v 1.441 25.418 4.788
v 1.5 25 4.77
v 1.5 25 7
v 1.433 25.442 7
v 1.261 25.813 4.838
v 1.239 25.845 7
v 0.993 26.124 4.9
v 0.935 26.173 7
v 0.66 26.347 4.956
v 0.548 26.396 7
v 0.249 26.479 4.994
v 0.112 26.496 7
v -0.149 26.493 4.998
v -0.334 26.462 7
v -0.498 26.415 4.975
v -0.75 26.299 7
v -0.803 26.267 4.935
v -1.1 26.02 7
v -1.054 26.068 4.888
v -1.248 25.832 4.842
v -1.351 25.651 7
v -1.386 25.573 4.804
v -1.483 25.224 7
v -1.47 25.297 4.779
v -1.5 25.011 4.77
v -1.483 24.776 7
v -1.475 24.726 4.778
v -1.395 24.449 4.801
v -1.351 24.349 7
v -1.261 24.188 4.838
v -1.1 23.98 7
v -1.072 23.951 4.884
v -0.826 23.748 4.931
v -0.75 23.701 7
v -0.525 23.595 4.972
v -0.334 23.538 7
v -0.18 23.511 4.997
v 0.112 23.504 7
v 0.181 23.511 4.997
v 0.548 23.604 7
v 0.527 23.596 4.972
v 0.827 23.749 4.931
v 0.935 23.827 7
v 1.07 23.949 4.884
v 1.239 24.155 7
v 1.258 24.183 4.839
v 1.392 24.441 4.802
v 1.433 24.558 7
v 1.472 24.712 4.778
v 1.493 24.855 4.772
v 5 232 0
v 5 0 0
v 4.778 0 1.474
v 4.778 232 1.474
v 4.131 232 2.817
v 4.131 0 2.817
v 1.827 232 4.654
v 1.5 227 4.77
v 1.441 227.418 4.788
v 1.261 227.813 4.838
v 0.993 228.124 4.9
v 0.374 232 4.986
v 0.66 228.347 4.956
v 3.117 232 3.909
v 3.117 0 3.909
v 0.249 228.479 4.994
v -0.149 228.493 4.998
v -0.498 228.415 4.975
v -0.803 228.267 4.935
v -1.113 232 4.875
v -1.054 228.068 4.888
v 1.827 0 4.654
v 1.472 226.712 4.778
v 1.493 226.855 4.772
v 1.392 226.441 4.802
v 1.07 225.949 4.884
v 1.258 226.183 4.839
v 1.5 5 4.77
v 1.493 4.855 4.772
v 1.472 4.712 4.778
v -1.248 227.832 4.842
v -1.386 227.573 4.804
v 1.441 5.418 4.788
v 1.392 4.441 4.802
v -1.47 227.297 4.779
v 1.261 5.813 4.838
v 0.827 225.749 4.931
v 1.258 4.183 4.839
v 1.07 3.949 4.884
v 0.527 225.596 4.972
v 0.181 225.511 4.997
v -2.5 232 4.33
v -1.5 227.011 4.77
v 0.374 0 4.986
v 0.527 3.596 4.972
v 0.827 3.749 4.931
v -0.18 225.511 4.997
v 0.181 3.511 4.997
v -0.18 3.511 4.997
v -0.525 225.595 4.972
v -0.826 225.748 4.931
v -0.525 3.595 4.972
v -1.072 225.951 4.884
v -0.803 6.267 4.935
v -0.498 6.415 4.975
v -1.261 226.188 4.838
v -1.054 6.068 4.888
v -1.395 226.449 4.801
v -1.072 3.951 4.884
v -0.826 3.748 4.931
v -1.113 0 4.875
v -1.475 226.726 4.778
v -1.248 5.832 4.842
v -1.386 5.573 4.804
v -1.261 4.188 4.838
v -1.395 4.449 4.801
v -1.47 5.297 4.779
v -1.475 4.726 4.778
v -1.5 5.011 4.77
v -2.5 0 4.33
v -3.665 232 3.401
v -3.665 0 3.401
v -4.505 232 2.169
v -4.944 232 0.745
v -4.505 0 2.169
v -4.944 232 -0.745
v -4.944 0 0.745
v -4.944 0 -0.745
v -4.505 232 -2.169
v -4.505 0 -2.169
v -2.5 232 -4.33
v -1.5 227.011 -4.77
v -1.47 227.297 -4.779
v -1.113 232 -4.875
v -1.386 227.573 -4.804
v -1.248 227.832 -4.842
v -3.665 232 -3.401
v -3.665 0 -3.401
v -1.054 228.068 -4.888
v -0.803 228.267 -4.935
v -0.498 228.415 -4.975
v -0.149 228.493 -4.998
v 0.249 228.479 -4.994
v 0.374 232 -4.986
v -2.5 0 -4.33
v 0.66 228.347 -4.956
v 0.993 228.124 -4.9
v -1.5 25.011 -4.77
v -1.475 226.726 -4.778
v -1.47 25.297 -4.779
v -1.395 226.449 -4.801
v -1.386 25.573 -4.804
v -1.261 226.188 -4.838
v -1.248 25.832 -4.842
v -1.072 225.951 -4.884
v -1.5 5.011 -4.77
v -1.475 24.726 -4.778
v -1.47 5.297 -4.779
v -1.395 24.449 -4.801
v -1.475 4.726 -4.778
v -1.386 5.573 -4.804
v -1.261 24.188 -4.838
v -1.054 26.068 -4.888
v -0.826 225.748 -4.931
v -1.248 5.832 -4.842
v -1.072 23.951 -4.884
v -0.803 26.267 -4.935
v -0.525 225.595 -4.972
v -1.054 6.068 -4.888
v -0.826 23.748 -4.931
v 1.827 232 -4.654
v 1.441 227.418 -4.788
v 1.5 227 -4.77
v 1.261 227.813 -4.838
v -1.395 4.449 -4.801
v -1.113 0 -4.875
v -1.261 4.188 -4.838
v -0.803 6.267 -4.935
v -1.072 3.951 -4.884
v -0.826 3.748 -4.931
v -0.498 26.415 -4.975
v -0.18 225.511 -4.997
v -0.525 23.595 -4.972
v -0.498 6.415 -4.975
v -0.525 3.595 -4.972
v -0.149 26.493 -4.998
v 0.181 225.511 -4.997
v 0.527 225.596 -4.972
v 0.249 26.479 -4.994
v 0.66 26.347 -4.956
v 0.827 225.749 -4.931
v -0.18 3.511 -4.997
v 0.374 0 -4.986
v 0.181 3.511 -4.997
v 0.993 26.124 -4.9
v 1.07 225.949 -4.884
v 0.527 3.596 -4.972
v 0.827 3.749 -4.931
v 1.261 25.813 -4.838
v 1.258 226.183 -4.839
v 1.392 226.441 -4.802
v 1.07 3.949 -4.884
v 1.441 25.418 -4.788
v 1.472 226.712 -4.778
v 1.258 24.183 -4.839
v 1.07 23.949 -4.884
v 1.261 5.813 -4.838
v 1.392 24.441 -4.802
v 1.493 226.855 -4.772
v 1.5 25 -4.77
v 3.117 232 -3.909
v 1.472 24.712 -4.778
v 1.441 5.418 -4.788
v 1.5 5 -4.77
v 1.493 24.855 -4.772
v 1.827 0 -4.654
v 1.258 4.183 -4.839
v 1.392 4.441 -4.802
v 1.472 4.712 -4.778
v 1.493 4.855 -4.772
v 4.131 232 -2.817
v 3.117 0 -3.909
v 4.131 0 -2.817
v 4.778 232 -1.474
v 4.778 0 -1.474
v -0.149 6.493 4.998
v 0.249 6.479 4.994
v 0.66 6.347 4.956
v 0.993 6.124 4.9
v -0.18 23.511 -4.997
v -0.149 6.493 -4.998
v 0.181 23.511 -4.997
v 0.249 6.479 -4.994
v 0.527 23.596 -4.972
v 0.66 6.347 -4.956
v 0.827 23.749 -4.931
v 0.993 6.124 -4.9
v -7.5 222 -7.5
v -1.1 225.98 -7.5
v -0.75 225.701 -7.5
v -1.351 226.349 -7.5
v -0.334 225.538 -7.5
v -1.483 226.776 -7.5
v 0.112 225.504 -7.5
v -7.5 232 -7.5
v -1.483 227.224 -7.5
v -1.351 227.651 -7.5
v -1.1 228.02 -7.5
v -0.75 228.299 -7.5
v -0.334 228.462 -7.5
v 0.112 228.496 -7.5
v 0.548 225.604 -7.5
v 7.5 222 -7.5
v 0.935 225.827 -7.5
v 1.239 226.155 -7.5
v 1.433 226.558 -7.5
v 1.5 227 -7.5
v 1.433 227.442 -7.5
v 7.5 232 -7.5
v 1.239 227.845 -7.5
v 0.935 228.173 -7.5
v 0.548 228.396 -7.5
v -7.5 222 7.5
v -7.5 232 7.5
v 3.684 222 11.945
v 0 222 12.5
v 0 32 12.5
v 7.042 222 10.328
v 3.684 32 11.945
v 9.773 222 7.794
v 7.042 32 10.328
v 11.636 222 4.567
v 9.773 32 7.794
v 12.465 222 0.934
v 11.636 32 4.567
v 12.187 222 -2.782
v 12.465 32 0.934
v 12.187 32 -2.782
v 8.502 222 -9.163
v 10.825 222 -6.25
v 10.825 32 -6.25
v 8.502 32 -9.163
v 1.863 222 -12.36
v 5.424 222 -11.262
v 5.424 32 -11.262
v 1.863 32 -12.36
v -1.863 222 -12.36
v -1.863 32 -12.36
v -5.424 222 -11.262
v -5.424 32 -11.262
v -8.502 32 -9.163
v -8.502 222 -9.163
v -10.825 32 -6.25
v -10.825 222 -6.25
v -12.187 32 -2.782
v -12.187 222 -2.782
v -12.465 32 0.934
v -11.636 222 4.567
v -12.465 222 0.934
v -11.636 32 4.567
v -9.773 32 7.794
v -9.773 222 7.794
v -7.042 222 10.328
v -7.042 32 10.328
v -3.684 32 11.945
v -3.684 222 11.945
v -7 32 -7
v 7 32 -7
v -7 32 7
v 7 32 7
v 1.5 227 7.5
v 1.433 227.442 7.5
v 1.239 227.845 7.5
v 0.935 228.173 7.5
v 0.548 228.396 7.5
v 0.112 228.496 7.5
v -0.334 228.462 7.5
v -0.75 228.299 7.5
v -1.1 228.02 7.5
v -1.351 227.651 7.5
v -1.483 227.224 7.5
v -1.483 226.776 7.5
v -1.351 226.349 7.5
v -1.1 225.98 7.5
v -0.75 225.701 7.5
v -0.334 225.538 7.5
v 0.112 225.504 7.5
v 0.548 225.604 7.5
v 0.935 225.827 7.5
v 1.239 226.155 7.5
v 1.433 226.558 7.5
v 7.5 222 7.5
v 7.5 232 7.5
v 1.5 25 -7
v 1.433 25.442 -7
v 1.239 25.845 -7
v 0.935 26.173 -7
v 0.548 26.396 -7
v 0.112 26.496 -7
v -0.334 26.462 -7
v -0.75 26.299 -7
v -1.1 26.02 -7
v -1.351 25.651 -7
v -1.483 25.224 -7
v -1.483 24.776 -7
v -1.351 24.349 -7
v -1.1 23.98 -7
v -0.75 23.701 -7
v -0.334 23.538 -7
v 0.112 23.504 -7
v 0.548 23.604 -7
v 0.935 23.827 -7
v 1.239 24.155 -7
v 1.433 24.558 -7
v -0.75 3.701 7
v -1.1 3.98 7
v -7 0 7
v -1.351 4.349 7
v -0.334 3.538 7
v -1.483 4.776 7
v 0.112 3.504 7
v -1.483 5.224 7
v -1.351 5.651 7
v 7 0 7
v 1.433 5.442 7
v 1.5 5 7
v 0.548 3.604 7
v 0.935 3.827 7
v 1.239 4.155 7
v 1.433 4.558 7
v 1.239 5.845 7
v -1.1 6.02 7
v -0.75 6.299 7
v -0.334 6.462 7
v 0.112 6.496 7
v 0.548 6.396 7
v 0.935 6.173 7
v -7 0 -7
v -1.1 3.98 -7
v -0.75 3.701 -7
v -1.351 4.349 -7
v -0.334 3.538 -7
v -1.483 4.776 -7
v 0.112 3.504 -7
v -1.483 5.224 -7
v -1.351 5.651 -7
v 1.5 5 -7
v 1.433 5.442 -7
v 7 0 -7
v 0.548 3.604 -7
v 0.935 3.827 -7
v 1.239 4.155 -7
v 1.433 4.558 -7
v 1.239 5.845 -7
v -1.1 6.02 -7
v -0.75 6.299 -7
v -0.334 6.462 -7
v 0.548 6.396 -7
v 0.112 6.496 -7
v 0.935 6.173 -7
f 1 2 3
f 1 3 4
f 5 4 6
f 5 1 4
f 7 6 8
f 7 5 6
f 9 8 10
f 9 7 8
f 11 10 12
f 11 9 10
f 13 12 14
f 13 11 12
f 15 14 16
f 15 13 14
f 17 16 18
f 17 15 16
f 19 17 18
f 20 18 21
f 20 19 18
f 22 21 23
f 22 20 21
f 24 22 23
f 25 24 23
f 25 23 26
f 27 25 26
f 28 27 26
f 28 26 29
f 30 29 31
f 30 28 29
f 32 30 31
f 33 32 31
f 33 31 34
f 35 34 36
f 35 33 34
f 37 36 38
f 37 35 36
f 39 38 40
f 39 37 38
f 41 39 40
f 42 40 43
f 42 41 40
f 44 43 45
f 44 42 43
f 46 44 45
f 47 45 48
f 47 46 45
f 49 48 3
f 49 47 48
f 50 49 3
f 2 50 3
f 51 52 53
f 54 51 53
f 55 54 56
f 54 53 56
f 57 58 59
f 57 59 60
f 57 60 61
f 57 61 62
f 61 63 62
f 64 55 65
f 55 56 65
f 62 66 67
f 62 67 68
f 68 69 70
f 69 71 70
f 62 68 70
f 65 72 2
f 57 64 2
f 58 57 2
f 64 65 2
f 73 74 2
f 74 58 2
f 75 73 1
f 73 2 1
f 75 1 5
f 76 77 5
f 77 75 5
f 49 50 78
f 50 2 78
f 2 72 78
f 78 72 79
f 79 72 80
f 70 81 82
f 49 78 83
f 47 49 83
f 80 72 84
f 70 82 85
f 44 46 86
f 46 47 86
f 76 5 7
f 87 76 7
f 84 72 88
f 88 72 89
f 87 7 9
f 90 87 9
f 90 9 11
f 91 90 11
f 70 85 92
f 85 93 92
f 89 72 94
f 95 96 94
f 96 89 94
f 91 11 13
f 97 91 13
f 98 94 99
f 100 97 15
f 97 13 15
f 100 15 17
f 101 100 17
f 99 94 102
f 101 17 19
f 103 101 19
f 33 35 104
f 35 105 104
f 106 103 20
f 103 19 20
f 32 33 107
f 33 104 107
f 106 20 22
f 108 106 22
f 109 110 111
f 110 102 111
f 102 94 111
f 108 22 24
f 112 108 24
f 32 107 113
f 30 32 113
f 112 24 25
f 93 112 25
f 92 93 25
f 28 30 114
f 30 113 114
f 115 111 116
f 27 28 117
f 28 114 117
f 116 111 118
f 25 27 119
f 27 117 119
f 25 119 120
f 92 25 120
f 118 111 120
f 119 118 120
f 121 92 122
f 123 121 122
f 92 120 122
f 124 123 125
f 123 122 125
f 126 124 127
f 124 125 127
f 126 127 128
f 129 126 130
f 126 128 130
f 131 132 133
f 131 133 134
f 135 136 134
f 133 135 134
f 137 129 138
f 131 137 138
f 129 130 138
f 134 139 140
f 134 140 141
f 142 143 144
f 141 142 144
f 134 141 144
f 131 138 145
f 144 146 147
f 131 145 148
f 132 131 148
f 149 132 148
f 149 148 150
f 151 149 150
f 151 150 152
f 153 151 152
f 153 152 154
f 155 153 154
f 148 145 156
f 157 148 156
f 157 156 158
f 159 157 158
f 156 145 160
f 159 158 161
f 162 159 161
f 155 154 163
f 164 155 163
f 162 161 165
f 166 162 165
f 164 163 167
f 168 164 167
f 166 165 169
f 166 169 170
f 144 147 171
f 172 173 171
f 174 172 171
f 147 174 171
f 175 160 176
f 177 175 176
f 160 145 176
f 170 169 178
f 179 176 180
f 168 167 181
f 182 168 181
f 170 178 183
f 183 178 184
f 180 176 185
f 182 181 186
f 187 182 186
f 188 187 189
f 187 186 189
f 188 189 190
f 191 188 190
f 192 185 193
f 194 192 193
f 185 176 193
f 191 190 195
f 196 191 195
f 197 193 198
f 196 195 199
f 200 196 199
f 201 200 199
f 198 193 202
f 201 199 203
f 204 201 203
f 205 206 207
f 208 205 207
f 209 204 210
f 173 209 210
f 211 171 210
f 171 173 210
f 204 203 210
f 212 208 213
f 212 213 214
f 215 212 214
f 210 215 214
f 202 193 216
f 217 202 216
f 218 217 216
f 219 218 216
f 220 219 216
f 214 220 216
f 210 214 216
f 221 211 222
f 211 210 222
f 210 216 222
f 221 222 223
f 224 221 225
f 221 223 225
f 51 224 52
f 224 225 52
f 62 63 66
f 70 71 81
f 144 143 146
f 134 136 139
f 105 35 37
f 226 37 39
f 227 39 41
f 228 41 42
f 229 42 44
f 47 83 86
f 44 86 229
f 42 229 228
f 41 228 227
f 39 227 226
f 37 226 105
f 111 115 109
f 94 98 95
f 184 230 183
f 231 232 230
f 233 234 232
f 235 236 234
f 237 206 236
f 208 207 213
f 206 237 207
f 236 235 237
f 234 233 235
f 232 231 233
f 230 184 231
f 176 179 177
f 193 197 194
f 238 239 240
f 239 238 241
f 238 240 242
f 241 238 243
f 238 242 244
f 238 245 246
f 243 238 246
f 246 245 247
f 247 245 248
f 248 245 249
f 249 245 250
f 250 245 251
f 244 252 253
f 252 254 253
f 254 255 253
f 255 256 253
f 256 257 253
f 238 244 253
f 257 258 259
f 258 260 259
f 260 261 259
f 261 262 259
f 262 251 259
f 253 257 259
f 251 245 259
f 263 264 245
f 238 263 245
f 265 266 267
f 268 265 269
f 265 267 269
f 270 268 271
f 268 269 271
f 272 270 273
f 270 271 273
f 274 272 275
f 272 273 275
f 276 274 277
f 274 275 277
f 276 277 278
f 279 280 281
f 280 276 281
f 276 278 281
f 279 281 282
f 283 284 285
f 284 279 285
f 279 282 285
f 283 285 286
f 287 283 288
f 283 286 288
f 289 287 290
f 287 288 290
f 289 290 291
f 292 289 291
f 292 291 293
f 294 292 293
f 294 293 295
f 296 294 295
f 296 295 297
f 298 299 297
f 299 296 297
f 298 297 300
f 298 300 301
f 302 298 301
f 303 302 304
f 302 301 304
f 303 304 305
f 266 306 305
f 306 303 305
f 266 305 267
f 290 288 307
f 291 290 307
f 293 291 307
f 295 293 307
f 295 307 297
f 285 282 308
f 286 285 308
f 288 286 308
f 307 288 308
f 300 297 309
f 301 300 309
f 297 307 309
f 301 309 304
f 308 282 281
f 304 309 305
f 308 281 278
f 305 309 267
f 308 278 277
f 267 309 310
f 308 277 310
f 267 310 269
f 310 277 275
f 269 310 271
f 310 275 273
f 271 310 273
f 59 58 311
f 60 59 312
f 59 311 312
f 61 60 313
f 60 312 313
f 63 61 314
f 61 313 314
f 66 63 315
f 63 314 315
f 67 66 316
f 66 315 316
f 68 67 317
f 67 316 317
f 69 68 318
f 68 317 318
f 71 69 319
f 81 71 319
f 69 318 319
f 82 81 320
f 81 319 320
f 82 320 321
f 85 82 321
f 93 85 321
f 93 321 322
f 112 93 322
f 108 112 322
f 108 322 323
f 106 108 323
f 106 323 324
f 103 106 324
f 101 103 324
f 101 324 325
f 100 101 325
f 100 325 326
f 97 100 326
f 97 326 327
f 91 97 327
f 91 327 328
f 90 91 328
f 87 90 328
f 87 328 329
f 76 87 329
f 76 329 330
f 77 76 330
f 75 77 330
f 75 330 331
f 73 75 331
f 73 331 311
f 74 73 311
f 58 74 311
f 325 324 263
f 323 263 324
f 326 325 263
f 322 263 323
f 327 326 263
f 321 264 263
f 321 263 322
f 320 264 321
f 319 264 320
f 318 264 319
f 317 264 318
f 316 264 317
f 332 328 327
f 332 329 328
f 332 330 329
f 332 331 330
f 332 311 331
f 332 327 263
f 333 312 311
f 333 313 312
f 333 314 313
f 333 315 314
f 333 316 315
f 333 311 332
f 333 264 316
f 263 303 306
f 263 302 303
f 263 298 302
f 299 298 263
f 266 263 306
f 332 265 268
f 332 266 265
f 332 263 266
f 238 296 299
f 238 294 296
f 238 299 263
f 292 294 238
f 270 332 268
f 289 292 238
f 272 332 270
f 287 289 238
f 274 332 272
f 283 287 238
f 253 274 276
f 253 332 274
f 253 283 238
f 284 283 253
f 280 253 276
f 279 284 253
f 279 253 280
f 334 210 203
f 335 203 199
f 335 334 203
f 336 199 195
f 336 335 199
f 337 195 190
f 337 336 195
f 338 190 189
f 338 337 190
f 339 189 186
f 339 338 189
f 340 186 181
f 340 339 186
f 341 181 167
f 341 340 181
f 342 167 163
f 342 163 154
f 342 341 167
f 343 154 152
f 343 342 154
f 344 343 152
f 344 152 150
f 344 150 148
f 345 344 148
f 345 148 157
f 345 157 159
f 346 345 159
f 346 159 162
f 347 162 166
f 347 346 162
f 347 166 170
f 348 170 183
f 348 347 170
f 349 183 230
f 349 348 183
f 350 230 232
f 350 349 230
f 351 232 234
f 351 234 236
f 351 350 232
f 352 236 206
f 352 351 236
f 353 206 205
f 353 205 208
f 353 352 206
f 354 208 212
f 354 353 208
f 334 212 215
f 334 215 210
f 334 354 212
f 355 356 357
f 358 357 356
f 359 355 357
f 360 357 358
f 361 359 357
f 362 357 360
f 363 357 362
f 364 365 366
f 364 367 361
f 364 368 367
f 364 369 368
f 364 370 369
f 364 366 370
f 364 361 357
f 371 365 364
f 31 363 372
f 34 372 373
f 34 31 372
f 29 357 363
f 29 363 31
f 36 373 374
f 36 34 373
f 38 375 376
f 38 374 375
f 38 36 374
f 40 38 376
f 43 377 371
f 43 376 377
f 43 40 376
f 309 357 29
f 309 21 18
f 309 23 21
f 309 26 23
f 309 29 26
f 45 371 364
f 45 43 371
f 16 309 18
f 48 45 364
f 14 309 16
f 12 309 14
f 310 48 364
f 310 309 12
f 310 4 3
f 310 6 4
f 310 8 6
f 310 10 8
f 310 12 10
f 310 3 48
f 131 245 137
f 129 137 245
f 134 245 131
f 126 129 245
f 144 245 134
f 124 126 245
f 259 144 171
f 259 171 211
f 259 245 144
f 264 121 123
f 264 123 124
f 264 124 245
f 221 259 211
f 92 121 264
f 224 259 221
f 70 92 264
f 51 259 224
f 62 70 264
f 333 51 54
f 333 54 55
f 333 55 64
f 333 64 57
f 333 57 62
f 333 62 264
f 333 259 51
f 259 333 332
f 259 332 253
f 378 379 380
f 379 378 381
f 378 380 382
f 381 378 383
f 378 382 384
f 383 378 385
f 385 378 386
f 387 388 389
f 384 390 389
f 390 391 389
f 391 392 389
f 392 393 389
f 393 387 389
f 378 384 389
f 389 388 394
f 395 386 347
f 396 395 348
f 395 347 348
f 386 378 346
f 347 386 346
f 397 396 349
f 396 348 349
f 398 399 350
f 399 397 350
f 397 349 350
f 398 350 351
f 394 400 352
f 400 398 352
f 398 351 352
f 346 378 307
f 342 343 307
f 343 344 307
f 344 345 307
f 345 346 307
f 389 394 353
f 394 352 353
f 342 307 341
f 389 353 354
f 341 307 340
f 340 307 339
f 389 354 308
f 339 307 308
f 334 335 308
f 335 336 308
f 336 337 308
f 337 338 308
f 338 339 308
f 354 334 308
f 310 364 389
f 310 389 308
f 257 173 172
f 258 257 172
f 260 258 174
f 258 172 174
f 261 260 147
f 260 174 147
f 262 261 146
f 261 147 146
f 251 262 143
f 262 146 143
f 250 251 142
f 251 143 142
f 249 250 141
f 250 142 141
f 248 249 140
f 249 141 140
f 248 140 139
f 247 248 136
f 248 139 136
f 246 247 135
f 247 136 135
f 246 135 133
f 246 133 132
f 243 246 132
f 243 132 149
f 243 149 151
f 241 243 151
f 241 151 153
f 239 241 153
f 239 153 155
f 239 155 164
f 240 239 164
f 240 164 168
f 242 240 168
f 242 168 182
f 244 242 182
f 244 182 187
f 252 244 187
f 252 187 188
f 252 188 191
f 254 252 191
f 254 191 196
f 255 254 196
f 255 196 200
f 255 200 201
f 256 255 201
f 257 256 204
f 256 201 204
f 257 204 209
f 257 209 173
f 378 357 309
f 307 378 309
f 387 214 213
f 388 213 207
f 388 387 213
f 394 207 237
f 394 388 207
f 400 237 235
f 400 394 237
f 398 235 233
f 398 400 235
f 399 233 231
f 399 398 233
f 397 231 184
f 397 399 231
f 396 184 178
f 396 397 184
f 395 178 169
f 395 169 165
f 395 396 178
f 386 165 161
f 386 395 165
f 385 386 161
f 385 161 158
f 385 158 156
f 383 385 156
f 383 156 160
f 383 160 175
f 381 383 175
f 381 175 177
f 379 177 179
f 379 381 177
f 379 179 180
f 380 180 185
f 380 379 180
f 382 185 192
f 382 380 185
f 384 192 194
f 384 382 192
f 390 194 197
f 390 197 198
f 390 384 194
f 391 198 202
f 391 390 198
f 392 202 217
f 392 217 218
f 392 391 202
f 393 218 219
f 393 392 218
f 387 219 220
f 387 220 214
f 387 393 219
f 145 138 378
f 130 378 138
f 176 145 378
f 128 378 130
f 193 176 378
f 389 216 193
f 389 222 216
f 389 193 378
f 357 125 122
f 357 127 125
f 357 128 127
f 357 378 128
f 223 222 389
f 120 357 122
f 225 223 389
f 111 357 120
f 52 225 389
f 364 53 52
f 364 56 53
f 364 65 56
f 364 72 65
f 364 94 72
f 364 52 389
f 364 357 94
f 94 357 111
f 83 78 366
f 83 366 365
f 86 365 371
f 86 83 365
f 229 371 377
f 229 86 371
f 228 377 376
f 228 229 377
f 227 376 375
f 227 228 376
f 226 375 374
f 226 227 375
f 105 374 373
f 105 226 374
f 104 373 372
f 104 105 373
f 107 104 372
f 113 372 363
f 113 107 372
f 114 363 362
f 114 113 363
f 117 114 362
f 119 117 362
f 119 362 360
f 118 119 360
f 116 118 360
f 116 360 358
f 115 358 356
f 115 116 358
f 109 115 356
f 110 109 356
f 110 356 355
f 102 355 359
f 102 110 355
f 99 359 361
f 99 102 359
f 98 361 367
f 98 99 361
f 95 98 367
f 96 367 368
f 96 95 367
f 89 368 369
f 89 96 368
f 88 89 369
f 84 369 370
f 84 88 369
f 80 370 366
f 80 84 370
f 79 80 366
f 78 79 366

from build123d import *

# Parameters (mm, degrees)
SKETCH1_W           = 14
SKETCH1_H           = 32
SKETCH1_R           = 1.5
BOSS_EXTRUDE1_DEPTH = 7
SKETCH3_R           = 12.5
BOSS_EXTRUDE2_DEPTH = 200
SKETCH4_OUTSIDE_W   = 73.936
SKETCH4_OUTSIDE_H   = 73.936
SKETCH4_OUTSIDE_W_2 = 15
SKETCH4_OUTSIDE_H_2 = 15
CUT_EXTRUDE1_DEPTH  = 10
SKETCH5_R           = 1.5
CUT_EXTRUDE2_DEPTH  = 234.195733237
SKETCH6_R           = 5
CUT_EXTRUDE3_DEPTH  = 233.672516641


with BuildPart() as part:
    # Sketch1 → Boss-Extrude1 (new, symmetric)
    with BuildSketch(Plane.XY):
        with Locations((0, 16)):
            Rectangle(SKETCH1_W, SKETCH1_H)
        with Locations((0, 5)):
            Circle(SKETCH1_R, mode=Mode.SUBTRACT)
        with Locations((0, 25)):
            Circle(SKETCH1_R, mode=Mode.SUBTRACT)
    extrude(amount=BOSS_EXTRUDE1_DEPTH, both=True)

    # Sketch3 → Boss-Extrude2 (add)
    with BuildSketch(Plane(origin=(0, 32, 0), x_dir=(1, 0, 0), z_dir=(0, 1, 0))):
        with Locations(Location((0, 0, 0), (0, 0, 270))):
            Circle(SKETCH3_R)
    extrude(amount=BOSS_EXTRUDE2_DEPTH)

    # Sketch4 outside → Cut-Extrude1 (cut)
    with BuildSketch(Plane(origin=(0, 232, 0), x_dir=(1, 0, 0), z_dir=(0, 1, 0))):
        Rectangle(SKETCH4_OUTSIDE_W, SKETCH4_OUTSIDE_H)
        Rectangle(SKETCH4_OUTSIDE_W_2, SKETCH4_OUTSIDE_H_2, mode=Mode.SUBTRACT)
    extrude(amount=-CUT_EXTRUDE1_DEPTH, mode=Mode.SUBTRACT)

    # Sketch5 → Cut-Extrude2 (cut, through all)
    with BuildSketch(Plane.XY.offset(7.5)):
        with Locations((0, 227)):
            Circle(SKETCH5_R)
    extrude(amount=-CUT_EXTRUDE2_DEPTH, mode=Mode.SUBTRACT)

    # Sketch6 → Cut-Extrude3 (cut, through all)
    with BuildSketch(Plane.XZ):
        Circle(SKETCH6_R)
    extrude(amount=-CUT_EXTRUDE3_DEPTH, mode=Mode.SUBTRACT)


solid = part.part
